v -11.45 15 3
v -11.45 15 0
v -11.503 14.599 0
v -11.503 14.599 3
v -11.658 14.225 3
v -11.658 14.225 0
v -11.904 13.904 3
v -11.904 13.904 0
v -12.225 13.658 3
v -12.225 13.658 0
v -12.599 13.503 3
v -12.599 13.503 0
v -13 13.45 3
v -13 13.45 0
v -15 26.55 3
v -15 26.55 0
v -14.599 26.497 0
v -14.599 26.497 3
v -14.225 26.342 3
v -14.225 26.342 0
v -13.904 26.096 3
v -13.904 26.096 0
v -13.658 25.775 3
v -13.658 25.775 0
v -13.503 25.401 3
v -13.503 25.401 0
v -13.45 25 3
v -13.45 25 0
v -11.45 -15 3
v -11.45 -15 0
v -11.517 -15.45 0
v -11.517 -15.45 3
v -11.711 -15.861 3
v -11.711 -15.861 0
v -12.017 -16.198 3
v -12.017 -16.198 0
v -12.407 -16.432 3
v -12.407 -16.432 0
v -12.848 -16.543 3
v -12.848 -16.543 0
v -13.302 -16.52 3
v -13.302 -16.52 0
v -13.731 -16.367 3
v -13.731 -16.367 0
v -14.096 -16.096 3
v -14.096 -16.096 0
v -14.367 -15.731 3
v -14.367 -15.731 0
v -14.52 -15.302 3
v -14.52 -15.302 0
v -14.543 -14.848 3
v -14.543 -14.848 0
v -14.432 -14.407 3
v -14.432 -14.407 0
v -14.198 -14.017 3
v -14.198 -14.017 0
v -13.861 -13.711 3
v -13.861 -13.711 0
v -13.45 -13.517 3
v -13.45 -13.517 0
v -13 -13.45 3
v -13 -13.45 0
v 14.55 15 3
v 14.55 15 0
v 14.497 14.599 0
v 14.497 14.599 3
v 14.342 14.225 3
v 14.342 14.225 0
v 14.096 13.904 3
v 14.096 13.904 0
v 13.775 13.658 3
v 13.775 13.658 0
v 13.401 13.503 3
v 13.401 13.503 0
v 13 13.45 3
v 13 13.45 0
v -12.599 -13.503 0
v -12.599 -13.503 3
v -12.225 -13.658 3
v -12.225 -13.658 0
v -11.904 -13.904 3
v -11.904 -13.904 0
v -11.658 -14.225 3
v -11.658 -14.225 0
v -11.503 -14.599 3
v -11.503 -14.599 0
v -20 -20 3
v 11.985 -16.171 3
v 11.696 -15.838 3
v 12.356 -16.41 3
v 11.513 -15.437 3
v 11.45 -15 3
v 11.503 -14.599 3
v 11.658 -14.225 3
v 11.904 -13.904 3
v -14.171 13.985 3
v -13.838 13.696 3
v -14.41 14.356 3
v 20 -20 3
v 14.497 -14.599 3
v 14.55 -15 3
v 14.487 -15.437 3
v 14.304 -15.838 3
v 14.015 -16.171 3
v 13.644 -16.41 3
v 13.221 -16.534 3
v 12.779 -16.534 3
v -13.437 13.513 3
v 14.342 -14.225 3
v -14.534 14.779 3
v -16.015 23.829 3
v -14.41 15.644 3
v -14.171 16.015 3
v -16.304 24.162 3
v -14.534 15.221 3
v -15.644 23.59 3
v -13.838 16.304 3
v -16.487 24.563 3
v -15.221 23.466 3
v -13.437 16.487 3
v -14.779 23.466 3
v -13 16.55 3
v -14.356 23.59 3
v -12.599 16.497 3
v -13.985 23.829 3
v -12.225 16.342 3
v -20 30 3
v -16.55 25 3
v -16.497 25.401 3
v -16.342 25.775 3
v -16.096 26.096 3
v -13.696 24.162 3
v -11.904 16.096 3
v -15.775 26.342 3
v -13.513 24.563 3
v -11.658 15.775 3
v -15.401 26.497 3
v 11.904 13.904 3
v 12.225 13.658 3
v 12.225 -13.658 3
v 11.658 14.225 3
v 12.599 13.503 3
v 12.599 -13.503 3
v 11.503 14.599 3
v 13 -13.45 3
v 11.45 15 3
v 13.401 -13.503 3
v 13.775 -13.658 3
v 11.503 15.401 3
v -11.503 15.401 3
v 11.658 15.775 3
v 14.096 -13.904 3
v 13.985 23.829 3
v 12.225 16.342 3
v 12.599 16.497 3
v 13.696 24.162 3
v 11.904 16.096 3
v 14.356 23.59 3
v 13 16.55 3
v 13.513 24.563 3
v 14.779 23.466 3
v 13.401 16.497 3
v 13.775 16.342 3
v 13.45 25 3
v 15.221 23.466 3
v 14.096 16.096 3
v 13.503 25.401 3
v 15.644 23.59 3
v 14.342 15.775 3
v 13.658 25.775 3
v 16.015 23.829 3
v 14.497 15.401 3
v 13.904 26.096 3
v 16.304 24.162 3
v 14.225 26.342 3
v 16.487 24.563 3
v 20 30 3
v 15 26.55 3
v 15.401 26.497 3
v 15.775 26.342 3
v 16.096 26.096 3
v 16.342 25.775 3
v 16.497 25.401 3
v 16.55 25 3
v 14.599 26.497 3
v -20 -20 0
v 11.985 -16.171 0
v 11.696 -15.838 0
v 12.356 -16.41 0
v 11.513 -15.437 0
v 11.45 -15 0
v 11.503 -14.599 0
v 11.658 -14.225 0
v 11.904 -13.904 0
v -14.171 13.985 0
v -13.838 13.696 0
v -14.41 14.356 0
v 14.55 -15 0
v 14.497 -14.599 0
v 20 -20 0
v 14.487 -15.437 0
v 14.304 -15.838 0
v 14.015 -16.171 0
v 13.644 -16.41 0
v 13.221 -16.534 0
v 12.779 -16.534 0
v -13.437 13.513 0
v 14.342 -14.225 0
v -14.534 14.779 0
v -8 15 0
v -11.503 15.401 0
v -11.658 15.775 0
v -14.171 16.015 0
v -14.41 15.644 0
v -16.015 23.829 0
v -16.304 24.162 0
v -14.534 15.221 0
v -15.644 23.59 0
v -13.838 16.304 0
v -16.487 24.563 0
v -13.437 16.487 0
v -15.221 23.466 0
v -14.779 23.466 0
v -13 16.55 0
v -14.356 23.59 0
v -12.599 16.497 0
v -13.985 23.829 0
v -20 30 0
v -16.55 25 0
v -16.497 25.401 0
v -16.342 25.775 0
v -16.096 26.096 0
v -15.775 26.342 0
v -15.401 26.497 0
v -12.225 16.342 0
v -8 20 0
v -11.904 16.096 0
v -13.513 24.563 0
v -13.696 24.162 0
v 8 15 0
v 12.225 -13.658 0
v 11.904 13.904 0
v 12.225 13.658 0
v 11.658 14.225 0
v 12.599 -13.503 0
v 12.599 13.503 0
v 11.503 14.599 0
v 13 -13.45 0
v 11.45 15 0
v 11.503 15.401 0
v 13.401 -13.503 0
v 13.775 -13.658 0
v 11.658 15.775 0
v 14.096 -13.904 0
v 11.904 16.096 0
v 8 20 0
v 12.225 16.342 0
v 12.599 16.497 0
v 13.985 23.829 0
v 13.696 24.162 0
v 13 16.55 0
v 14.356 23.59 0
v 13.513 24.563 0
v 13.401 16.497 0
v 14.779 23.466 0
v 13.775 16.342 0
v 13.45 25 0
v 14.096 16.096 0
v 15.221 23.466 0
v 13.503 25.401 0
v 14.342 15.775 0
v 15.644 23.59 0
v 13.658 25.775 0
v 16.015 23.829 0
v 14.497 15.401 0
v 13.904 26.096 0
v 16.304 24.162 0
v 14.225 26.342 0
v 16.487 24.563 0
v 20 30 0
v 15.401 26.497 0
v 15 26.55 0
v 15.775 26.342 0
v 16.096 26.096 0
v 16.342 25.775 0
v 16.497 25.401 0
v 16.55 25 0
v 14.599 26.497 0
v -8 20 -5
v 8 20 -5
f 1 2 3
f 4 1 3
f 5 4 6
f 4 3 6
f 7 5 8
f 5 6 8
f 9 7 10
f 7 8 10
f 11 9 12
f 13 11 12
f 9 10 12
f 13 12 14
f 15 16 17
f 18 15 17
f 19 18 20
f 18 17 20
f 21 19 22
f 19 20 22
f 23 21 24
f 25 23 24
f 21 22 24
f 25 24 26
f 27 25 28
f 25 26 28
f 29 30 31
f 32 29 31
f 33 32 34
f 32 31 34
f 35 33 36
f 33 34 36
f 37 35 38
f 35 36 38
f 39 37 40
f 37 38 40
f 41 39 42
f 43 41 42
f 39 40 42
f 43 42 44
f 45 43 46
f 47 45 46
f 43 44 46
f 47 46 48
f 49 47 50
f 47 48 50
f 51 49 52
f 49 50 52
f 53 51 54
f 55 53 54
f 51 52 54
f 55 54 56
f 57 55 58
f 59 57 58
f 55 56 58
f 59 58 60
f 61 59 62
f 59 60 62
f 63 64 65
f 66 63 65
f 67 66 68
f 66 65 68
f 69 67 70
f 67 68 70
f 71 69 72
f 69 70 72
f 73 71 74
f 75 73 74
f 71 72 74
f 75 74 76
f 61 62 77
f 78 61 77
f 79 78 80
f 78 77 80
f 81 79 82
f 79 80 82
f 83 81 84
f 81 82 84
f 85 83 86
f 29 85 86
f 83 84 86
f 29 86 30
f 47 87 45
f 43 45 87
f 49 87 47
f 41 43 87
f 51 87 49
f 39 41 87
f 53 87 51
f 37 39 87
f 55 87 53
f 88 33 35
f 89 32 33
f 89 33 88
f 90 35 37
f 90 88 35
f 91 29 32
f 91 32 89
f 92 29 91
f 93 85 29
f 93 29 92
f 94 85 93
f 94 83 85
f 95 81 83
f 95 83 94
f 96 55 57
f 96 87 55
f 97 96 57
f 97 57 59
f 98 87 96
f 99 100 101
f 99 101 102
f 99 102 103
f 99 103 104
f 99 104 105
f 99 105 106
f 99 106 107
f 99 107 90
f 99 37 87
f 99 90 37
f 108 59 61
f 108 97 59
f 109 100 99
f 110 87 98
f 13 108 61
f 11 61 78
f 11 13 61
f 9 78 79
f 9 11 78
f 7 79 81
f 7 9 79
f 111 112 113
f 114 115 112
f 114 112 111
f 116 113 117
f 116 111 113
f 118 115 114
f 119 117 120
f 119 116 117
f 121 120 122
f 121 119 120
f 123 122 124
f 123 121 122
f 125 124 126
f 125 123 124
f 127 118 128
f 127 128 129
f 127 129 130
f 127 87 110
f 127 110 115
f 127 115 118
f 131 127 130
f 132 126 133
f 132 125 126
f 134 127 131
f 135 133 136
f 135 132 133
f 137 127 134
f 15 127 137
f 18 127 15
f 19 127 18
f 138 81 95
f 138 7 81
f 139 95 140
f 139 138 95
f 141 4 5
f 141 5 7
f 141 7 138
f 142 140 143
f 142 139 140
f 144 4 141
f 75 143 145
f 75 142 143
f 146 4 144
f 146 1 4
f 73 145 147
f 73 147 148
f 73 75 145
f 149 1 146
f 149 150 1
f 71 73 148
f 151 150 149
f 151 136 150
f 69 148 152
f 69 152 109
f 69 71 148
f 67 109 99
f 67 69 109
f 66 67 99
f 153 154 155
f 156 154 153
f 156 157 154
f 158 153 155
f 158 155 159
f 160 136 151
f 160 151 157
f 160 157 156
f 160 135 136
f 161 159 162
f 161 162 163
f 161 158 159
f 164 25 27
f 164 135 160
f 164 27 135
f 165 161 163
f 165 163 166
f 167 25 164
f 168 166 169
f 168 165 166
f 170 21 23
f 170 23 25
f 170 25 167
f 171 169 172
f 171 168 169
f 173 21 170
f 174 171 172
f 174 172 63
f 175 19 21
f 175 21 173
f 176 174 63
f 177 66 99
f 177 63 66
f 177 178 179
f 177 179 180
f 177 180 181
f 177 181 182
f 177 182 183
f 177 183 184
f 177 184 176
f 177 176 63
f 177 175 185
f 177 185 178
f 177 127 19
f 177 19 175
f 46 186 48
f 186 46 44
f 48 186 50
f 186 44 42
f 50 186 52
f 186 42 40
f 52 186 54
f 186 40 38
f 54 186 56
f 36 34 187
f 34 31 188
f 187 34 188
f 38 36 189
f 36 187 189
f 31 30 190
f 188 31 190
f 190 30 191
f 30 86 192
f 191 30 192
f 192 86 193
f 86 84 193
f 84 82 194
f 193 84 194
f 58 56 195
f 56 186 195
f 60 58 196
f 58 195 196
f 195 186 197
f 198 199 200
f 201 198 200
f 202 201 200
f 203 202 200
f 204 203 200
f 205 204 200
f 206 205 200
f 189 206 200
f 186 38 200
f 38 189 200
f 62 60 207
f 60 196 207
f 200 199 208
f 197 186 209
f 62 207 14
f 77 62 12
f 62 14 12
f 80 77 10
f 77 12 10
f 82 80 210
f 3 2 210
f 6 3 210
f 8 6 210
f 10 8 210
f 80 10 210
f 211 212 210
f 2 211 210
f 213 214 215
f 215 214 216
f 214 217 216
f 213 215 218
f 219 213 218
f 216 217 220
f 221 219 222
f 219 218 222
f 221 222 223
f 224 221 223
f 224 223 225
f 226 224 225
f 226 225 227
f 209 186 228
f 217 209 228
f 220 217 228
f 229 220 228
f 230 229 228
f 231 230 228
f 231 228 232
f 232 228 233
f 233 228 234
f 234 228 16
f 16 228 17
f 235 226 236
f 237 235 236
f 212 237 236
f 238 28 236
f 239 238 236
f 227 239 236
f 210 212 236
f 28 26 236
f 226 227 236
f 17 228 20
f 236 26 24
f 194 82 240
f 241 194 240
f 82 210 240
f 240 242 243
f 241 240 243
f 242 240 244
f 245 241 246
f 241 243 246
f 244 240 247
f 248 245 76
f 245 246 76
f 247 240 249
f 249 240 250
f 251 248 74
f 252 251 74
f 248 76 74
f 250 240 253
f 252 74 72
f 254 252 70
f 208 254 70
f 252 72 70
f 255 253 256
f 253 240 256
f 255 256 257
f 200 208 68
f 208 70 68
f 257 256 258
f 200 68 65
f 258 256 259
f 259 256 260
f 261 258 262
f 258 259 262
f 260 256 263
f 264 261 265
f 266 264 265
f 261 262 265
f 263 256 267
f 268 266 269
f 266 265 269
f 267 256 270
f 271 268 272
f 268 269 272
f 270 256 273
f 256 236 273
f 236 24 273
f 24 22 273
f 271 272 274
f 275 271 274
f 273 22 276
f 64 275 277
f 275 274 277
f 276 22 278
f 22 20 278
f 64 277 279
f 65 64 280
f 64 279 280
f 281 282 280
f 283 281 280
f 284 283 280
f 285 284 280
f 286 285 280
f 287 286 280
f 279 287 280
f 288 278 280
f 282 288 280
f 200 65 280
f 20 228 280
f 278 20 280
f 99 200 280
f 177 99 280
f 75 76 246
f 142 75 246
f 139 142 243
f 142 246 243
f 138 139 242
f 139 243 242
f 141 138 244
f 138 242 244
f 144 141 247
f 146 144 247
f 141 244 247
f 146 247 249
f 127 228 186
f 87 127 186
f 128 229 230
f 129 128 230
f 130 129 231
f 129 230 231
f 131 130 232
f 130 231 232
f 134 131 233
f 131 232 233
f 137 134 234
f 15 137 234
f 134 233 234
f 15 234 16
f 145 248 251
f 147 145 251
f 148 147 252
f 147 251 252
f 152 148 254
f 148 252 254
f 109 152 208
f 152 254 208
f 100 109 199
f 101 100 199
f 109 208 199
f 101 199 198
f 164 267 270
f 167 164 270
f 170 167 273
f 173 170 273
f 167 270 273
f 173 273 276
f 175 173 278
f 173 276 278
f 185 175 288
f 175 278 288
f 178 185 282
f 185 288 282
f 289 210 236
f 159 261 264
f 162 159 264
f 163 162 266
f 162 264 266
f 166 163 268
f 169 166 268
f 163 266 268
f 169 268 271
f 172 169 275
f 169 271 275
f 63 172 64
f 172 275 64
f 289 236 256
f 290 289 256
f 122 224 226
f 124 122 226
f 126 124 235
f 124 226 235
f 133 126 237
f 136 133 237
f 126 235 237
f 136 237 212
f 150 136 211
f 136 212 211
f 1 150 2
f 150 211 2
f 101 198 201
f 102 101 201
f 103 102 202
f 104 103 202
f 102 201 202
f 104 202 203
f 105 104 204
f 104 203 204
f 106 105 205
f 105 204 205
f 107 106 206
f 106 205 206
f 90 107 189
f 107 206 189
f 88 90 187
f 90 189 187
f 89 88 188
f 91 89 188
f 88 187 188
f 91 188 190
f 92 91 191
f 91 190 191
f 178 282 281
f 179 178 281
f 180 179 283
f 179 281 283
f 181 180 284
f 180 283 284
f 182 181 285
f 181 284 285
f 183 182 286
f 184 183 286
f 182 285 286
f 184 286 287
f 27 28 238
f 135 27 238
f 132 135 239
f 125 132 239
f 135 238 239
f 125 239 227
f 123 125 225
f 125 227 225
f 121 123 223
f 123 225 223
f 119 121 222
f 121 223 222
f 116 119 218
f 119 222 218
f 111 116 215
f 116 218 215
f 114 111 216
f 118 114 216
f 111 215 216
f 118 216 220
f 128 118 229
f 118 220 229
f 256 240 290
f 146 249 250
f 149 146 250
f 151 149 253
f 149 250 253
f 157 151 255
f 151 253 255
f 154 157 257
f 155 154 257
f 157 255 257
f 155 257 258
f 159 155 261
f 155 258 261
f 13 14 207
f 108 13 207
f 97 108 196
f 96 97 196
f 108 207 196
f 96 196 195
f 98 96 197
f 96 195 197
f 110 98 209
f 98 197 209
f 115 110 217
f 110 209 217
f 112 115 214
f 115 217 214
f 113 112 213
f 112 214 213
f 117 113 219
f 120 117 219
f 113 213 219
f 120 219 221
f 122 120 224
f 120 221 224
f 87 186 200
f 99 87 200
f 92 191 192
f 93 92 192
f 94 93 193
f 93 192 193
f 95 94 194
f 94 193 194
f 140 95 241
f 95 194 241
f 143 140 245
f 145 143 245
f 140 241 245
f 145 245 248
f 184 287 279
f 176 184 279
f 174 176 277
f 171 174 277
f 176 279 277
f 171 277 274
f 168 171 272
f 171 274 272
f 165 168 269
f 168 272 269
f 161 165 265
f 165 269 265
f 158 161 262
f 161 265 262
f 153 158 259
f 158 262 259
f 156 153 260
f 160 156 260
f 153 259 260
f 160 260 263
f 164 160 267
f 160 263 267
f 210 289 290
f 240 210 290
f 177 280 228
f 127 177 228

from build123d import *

# Parameters (mm, degrees)
F0_W     = 16
F0_H     = 5
F1_DEPTH = 3
F2_DEPTH = 5
F3_SIZE  = 4.99999


# Not quite as in the source:
# - a fillet or chamfer is up to 0.001 mm smaller than in the source, because OpenCascade refuses the exact size


with BuildPart() as f1:
    # F0 (on Top) → F1 (new body)
    with BuildSketch(Plane.XY):
        with BuildLine():
            ThreePointArc((-13, -13.45), (-11.9039844892, -13.9039844892), (-11.45, -15))
            Line((-11.45, -15), (11.45, -15))
            ThreePointArc((11.45, -15), (11.9039844892, -13.9039844892), (13, -13.45))
            Line((13, -13.45), (13, 13.45))
            ThreePointArc((13, 13.45), (11.9039844892, 13.9039844892), (11.45, 15))
            Line((11.45, 15), (8, 15))
            Line((8, 15), (-8, 15))
            Line((-8, 15), (-11.45, 15))
            ThreePointArc((-11.45, 15), (-11.9039844892, 13.9039844892), (-13, 13.45))
            Line((-13, 13.45), (-13, -13.45))
        make_face()
        with BuildLine():
            Line((11.45, -15), (-11.45, -15))
            ThreePointArc((-11.45, -15), (-14.0960155108, -16.0960155108), (-13, -13.45))
            Line((-13, -13.45), (-13, 13.45))
            ThreePointArc((-13, 13.45), (-14.55, 15), (-13, 16.55))
            Line((-13, 16.55), (-13, 20))
            Line((-13, 20), (-20, 20))
            Line((-20, 20), (-20, -20))
            Line((-20, -20), (20, -20))
            Line((20, -20), (20, 20))
            Line((20, 20), (13, 20))
            Line((13, 20), (13, 16.55))
            ThreePointArc((13, 16.55), (14.0960155108, 16.0960155108), (14.55, 15))
            ThreePointArc((14.55, 15), (14.0960155108, 13.9039844892), (13, 13.45))
            Line((13, 13.45), (13, -13.45))
            ThreePointArc((13, -13.45), (14.0960155108, -13.9039844892), (14.55, -15))
            ThreePointArc((14.55, -15), (13, -16.55), (11.45, -15))
        make_face()
        with BuildLine():
            Line((-13, 20), (-13, 16.55))
            ThreePointArc((-13, 16.55), (-11.9039844892, 16.0960155108), (-11.45, 15))
            Line((-11.45, 15), (-8, 15))
            Line((-8, 15), (-8, 20))
            Line((-8, 20), (-13, 20))
        make_face()
        with BuildLine():
            Line((8, 15), (11.45, 15))
            ThreePointArc((11.45, 15), (11.9039844892, 16.0960155108), (13, 16.55))
            Line((13, 16.55), (13, 20))
            Line((13, 20), (8, 20))
            Line((8, 20), (8, 15))
        make_face()
        with BuildLine():
            Line((-20, 20), (-13, 20))
            Line((-13, 20), (-8, 20))
            Line((-8, 20), (8, 20))
            Line((8, 20), (13, 20))
            Line((13, 20), (20, 20))
            Line((20, 20), (20, 30))
            Line((20, 30), (15, 30))
            Line((15, 30), (15, 26.55))
            ThreePointArc((15, 26.55), (16.0960155108, 26.0960155108), (16.55, 25))
            ThreePointArc((16.55, 25), (15, 23.45), (13.45, 25))
            Line((13.45, 25), (-13.45, 25))
            ThreePointArc((-13.45, 25), (-15, 23.45), (-16.55, 25))
            Line((-16.55, 25), (-20, 25))
            Line((-20, 25), (-20, 20))
        make_face()
        with Locations((0, 17.5)):
            Rectangle(F0_W, F0_H)
        with BuildLine():
            Line((-20, 30), (-20, 25))
            Line((-20, 25), (-16.55, 25))
            ThreePointArc((-16.55, 25), (-16.0960155108, 26.0960155108), (-15, 26.55))
            Line((-15, 26.55), (-15, 30))
            Line((-15, 30), (-20, 30))
        make_face()
        with BuildLine():
            Line((15, 30), (-15, 30))
            Line((-15, 30), (-15, 26.55))
            ThreePointArc((-15, 26.55), (-13.9039844892, 26.0960155108), (-13.45, 25))
            Line((-13.45, 25), (13.45, 25))
            ThreePointArc((13.45, 25), (13.9039844892, 26.0960155108), (15, 26.55))
            Line((15, 26.55), (15, 30))
        make_face()
    extrude(amount=F1_DEPTH)

    # F0 (on Top) → F2 (join)
    with BuildSketch(Plane.XY):
        with Locations((0, 17.5)):
            Rectangle(F0_W, F0_H)
    extrude(amount=-F2_DEPTH)

    # F3 (size 5 in the source; OpenCascade refuses exactly that, so slightly less here)
    f3_edges = [f1.edges().sort_by_distance(p)[0] for p in [
        (0, 15, -5),
    ]]
    chamfer(f3_edges, length=F3_SIZE)


solid = f1.part
